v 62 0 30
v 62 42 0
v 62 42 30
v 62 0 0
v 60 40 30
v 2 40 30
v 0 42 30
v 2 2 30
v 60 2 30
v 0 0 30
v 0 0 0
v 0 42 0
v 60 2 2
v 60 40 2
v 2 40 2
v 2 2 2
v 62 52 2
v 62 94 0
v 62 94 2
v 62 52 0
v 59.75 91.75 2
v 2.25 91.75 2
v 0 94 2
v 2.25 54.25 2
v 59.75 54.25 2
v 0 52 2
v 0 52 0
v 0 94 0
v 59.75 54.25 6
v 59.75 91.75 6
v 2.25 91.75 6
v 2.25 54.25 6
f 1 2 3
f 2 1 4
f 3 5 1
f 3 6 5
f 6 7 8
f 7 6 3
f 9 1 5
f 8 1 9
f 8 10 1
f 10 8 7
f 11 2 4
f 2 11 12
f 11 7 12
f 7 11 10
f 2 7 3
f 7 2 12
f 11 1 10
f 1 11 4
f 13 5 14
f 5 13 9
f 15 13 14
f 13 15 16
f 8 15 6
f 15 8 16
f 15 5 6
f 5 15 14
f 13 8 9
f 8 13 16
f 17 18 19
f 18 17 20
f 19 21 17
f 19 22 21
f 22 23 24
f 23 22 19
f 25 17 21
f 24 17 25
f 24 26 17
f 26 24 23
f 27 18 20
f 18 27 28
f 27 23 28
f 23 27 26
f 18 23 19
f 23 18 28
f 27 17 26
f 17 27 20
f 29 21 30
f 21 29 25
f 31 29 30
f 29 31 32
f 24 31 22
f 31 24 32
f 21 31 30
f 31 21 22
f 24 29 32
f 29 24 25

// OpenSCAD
// Box with a press-fit lid - a hollow rectangular box (open top) and a separate lid whose plug
// drops into the opening. The two parts are laid side by side. NOVEL general part.
//
// @desc hollow box with a separate press-fit lid
// @prompt Design a small box with a lid in OpenSCAD: an inner space {il} by {iw} by {ih} mm with {wall} mm walls, and a separate lid whose plug drops {lip} mm into the opening. Lay the two parts side by side. Reply with a single complete OpenSCAD file.
// @param il   inner length, mm     [20:80]
// @param iw   inner width, mm      [20:60]
// @param ih   inner height, mm     [10:50]
// @param wall wall thickness, mm   [1.6:4]
// @param lip  lid plug depth, mm   [3:10]

il   = 58;
iw   = 38;
ih   = 28;
wall = 2;
lip  = 4;

$fn = 32;

ol = il + 2 * wall;
ow = iw + 2 * wall;

module box() {
    difference() {
        cube([ol, ow, ih + wall]);
        translate([wall, wall, wall]) cube([il, iw, ih + 1]);   // open-top cavity
    }
}

module lid() {
    cl = il - 0.5;                 // plug: 0.25 mm clearance per side
    cw = iw - 0.5;
    union() {
        cube([ol, ow, wall]);                                    // top plate, full footprint
        translate([(ol - cl) / 2, (ow - cw) / 2, 0])
            cube([cl, cw, wall + lip]);                          // plug (overlaps the plate -> one solid)
    }
}

box();
translate([0, ow + 10, 0]) lid();
